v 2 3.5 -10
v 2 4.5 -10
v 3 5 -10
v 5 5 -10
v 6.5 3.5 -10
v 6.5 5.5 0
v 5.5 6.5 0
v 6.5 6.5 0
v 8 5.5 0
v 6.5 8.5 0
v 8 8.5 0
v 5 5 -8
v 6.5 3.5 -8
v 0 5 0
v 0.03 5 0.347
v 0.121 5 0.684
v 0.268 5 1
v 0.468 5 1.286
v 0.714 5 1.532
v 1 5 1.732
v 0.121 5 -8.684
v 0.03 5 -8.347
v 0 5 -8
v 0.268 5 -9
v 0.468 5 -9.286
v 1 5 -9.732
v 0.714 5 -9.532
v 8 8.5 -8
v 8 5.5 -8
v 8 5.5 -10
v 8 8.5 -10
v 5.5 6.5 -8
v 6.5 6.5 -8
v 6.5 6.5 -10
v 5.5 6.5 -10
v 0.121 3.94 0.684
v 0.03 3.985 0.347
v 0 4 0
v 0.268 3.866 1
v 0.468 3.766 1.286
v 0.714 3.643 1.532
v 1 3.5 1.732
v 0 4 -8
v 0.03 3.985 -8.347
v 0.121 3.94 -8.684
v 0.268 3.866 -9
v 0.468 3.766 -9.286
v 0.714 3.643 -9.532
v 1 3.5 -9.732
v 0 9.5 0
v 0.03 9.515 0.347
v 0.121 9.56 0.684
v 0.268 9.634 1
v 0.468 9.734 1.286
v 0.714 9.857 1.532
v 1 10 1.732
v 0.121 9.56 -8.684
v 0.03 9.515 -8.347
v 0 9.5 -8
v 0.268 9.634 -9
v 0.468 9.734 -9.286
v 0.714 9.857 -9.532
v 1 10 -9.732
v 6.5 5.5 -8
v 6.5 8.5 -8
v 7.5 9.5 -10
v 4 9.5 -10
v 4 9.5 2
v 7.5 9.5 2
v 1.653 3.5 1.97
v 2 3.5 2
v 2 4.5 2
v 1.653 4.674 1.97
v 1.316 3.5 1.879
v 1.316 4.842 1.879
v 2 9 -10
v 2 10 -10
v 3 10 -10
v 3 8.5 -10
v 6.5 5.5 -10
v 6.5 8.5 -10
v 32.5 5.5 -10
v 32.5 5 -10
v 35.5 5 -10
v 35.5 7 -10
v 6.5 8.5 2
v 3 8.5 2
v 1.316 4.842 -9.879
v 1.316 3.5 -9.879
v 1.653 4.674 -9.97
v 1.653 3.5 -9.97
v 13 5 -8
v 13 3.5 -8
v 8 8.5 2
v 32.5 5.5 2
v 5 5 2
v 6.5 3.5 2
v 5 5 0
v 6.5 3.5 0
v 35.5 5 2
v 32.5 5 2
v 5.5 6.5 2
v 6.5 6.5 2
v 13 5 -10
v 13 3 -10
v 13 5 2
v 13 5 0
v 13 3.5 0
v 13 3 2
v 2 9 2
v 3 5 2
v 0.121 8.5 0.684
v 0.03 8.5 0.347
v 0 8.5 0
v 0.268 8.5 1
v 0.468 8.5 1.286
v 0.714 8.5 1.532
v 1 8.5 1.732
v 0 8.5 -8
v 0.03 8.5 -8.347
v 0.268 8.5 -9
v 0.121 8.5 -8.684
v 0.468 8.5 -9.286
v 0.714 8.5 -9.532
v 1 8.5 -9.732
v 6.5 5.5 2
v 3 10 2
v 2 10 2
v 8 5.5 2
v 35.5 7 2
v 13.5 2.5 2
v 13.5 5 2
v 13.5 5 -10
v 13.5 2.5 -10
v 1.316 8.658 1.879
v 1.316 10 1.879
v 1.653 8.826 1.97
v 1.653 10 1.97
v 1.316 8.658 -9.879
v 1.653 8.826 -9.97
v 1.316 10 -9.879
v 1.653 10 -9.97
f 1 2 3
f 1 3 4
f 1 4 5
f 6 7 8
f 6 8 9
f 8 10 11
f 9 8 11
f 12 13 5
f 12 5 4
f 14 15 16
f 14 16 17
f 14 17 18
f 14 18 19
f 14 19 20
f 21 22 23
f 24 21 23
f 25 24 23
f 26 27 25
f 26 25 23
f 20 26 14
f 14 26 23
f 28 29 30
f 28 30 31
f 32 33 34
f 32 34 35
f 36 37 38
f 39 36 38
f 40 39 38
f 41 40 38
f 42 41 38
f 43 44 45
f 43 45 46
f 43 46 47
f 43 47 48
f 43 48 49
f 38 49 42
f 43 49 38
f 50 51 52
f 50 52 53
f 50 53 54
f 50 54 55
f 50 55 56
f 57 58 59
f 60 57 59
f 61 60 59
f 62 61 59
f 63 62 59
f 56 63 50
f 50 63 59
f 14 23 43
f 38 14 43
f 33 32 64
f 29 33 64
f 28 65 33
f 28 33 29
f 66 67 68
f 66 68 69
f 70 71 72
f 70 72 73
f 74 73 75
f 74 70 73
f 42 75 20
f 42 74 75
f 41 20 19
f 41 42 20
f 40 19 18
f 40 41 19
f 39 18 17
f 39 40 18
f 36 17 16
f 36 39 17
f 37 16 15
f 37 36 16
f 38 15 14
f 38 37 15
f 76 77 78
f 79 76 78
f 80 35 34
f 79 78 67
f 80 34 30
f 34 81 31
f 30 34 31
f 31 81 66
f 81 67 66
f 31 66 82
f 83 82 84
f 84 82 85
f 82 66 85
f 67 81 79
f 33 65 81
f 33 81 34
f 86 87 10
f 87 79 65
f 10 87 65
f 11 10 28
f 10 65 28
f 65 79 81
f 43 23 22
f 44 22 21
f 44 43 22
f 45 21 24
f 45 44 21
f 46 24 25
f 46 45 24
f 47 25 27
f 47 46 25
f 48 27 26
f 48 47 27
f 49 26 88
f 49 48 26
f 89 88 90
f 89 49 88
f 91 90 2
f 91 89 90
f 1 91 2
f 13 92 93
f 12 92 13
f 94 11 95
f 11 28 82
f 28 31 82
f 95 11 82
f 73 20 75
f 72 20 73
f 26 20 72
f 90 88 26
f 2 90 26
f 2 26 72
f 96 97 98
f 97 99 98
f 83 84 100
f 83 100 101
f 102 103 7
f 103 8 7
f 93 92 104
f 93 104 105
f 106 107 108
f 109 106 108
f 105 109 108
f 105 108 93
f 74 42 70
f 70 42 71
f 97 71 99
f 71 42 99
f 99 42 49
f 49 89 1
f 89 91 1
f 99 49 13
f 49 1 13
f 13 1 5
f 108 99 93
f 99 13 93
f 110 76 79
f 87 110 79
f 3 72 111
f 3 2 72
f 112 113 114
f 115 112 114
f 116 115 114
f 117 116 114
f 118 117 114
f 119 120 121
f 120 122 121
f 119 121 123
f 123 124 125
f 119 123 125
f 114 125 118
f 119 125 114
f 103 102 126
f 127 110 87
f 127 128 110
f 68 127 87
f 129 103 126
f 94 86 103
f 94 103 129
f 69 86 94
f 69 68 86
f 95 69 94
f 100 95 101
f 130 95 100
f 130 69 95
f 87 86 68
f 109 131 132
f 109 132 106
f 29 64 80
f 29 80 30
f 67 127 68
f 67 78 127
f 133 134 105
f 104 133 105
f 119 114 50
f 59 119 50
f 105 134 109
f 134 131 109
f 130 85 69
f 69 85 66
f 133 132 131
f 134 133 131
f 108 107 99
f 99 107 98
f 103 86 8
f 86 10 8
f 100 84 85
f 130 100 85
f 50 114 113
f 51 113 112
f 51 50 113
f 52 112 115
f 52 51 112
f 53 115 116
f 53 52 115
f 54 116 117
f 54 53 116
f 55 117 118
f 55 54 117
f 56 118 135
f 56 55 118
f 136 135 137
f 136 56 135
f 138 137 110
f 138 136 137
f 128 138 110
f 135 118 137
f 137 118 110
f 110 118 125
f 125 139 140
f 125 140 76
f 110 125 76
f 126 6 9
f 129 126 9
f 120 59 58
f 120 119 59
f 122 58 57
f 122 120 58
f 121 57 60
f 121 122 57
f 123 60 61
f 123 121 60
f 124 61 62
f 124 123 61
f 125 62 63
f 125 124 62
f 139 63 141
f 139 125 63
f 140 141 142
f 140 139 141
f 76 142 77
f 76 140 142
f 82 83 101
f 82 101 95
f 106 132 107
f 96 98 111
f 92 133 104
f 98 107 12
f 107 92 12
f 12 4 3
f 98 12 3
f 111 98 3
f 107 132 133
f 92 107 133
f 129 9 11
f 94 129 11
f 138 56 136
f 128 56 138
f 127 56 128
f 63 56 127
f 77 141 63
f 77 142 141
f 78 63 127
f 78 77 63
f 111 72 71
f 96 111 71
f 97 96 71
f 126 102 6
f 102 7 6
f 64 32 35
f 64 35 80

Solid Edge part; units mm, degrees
sketch "Sketch1" plane through (0, 0, 0) normal (0, 0, 1) x (1, 0, 0)
  line L0 (8, 8.5) -> (32.5, 5.5)
  line L1 (32.5, 5) -> (32.5, 5.5)
  line L2 (35.5, 5) -> (32.5, 5)
  line L3 (35.5, 5) -> (35.5, 7)
  line L4 (35.5, 7) -> (7.5, 9.5)
  line L5 (4, 9.5) -> (7.5, 9.5)
  line L6 (3, 10) -> (4, 9.5)
  line L7 (1, 10) -> (3, 10)
  line L8 (0, 9.5) -> (1, 10)
  line L9 (0, 8.5) -> (0, 9.5)
  line L10 (0, 8.5) -> (1, 8.5)
  line L11 (1, 8.5) -> (2, 9)
  line L12 (2, 9) -> (3, 8.5)
  line L13 (3, 8.5) -> (6.5, 8.5)
  line L14 (6.5, 8.5) -> (6.5, 6.5)
  line L15 (6.5, 6.5) -> (5.5, 6.5)
  line L16 (5.5, 6.5) -> (6.5, 5.5)
  line L17 (6.5, 5.5) -> (8, 5.5)
  line L18 (8, 5.5) -> (8, 8.5)
  line L19 (5, 5) -> (4, 5)
  line L20 (3, 5) -> (4, 5)
  line L21 (2, 4.5) -> (3, 5)
  line L22 (1, 5) -> (2, 4.5)
  line L23 (0, 5) -> (1, 5)
  line L24 (0, 5) -> (0, 4)
  line L25 (0, 4) -> (1, 3.5)
  line L26 (1, 3.5) -> (4, 3.5)
  line L27 (4, 3.5) -> (6.5, 3.5)
  line L28 (6.5, 3.5) -> (5, 5)
  line L29 (13.5, 5) -> (13.5, 2.5)
  line L30 (13.5, 2.5) -> (13, 3)
  line L31 (13, 3) -> (13, 5)
  line L32 (13, 5) -> (13.5, 5)
  dimension "D1" = 22
extrude "Protrusion1" add sketch "Sketch1" along normal blind 2
fillet "Round_2" radius 2 2 edges at (0, 9, 2) (0, 4.5, 2)
sketch "Sketch2" plane through (0, 0, 0) normal (0, 0, 1) x (1, 0, 0)
  line L0 (35.5, 7) -> (7.5, 9.5)
  line L1 (4, 9.5) -> (7.5, 9.5)
  line L2 (3, 10) -> (4, 9.5)
  line L3 (1, 10) -> (3, 10)
  line L4 (0, 9.5) -> (1, 10)
  line L5 (0, 8.5) -> (0, 9.5)
  line L6 (0, 8.5) -> (1, 8.5)
  line L7 (1, 8.5) -> (2, 9)
  line L8 (2, 9) -> (3, 8.5)
  line L9 (3, 8.5) -> (6.5, 8.5)
  line L10 (6.5, 8.5) -> (8, 8.5)
  line L11 (8, 8.5) -> (32.5, 5.5)
  line L12 (32.5, 5) -> (32.5, 5.5)
  line L13 (35.5, 5) -> (32.5, 5)
  line L14 (35.5, 5) -> (35.5, 7)
  line L15 (5, 5) -> (13, 5)
  line L16 (13, 5) -> (13.5, 5)
  line L17 (13.5, 5) -> (13.5, 2.5)
  line L18 (13.5, 2.5) -> (13, 3)
  line L19 (13, 3.5) -> (13, 3)
  line L20 (6.5, 3.5) -> (13, 3.5)
  line L21 (4, 3.5) -> (6.5, 3.5)
  line L22 (1, 3.5) -> (4, 3.5)
  line L23 (0, 4) -> (1, 3.5)
  line L24 (0, 5) -> (0, 4)
  line L25 (0, 5) -> (1, 5)
  line L26 (1, 5) -> (2, 4.5)
  line L27 (2, 4.5) -> (3, 5)
  line L28 (3, 5) -> (4, 5)
  line L29 (5, 5) -> (4, 5)
  dimension "D1" = 22
extrude "MidExtrusion" add sketch "Sketch2" against normal blind 8
sketch "Sketch3" plane through (0, 0, -8) normal (0, 0, 1) x (1, 0, 0)
  line L0 (8, 8.5) -> (32.5, 5.5)
  line L1 (32.5, 5.5) -> (32.5, 5)
  line L2 (32.5, 5) -> (35.5, 5)
  line L3 (35.5, 5) -> (35.5, 7)
  line L4 (35.5, 7) -> (7.5, 9.5)
  line L5 (7.5, 9.5) -> (4, 9.5)
  line L6 (4, 9.5) -> (3, 10)
  line L7 (3, 10) -> (1, 10)
  line L8 (1, 10) -> (0, 9.5)
  line L9 (0, 9.5) -> (0, 8.5)
  line L10 (0, 8.5) -> (1, 8.5)
  line L11 (1, 8.5) -> (2, 9)
  line L12 (2, 9) -> (3, 8.5)
  line L13 (3, 8.5) -> (6.5, 8.5)
  line L14 (6.5, 8.5) -> (6.5, 6.5)
  line L15 (6.5, 6.5) -> (5.5, 6.5)
  line L16 (5.5, 6.5) -> (6.5, 5.5)
  line L17 (6.5, 5.5) -> (8, 5.5)
  line L18 (8, 5.5) -> (8, 8.5)
  line L19 (5, 5) -> (3, 5)
  line L20 (3, 5) -> (2, 4.5)
  line L21 (2, 4.5) -> (1, 5)
  line L22 (1, 5) -> (0, 5)
  line L23 (0, 5) -> (0, 4)
  line L24 (0, 4) -> (1, 3.5)
  line L25 (1, 3.5) -> (6.5, 3.5)
  line L26 (6.5, 3.5) -> (5, 5)
  line L27 (13.5, 5) -> (13.5, 2.5)
  line L28 (13.5, 2.5) -> (13, 3)
  line L29 (13, 3) -> (13, 5)
  line L30 (13, 5) -> (13.5, 5)
extrude "Protrusion2" add sketch "Sketch3" against normal blind 2
fillet "Round_3" radius 2 2 edges at (0, 9, -10) (0, 4.5, -10)
